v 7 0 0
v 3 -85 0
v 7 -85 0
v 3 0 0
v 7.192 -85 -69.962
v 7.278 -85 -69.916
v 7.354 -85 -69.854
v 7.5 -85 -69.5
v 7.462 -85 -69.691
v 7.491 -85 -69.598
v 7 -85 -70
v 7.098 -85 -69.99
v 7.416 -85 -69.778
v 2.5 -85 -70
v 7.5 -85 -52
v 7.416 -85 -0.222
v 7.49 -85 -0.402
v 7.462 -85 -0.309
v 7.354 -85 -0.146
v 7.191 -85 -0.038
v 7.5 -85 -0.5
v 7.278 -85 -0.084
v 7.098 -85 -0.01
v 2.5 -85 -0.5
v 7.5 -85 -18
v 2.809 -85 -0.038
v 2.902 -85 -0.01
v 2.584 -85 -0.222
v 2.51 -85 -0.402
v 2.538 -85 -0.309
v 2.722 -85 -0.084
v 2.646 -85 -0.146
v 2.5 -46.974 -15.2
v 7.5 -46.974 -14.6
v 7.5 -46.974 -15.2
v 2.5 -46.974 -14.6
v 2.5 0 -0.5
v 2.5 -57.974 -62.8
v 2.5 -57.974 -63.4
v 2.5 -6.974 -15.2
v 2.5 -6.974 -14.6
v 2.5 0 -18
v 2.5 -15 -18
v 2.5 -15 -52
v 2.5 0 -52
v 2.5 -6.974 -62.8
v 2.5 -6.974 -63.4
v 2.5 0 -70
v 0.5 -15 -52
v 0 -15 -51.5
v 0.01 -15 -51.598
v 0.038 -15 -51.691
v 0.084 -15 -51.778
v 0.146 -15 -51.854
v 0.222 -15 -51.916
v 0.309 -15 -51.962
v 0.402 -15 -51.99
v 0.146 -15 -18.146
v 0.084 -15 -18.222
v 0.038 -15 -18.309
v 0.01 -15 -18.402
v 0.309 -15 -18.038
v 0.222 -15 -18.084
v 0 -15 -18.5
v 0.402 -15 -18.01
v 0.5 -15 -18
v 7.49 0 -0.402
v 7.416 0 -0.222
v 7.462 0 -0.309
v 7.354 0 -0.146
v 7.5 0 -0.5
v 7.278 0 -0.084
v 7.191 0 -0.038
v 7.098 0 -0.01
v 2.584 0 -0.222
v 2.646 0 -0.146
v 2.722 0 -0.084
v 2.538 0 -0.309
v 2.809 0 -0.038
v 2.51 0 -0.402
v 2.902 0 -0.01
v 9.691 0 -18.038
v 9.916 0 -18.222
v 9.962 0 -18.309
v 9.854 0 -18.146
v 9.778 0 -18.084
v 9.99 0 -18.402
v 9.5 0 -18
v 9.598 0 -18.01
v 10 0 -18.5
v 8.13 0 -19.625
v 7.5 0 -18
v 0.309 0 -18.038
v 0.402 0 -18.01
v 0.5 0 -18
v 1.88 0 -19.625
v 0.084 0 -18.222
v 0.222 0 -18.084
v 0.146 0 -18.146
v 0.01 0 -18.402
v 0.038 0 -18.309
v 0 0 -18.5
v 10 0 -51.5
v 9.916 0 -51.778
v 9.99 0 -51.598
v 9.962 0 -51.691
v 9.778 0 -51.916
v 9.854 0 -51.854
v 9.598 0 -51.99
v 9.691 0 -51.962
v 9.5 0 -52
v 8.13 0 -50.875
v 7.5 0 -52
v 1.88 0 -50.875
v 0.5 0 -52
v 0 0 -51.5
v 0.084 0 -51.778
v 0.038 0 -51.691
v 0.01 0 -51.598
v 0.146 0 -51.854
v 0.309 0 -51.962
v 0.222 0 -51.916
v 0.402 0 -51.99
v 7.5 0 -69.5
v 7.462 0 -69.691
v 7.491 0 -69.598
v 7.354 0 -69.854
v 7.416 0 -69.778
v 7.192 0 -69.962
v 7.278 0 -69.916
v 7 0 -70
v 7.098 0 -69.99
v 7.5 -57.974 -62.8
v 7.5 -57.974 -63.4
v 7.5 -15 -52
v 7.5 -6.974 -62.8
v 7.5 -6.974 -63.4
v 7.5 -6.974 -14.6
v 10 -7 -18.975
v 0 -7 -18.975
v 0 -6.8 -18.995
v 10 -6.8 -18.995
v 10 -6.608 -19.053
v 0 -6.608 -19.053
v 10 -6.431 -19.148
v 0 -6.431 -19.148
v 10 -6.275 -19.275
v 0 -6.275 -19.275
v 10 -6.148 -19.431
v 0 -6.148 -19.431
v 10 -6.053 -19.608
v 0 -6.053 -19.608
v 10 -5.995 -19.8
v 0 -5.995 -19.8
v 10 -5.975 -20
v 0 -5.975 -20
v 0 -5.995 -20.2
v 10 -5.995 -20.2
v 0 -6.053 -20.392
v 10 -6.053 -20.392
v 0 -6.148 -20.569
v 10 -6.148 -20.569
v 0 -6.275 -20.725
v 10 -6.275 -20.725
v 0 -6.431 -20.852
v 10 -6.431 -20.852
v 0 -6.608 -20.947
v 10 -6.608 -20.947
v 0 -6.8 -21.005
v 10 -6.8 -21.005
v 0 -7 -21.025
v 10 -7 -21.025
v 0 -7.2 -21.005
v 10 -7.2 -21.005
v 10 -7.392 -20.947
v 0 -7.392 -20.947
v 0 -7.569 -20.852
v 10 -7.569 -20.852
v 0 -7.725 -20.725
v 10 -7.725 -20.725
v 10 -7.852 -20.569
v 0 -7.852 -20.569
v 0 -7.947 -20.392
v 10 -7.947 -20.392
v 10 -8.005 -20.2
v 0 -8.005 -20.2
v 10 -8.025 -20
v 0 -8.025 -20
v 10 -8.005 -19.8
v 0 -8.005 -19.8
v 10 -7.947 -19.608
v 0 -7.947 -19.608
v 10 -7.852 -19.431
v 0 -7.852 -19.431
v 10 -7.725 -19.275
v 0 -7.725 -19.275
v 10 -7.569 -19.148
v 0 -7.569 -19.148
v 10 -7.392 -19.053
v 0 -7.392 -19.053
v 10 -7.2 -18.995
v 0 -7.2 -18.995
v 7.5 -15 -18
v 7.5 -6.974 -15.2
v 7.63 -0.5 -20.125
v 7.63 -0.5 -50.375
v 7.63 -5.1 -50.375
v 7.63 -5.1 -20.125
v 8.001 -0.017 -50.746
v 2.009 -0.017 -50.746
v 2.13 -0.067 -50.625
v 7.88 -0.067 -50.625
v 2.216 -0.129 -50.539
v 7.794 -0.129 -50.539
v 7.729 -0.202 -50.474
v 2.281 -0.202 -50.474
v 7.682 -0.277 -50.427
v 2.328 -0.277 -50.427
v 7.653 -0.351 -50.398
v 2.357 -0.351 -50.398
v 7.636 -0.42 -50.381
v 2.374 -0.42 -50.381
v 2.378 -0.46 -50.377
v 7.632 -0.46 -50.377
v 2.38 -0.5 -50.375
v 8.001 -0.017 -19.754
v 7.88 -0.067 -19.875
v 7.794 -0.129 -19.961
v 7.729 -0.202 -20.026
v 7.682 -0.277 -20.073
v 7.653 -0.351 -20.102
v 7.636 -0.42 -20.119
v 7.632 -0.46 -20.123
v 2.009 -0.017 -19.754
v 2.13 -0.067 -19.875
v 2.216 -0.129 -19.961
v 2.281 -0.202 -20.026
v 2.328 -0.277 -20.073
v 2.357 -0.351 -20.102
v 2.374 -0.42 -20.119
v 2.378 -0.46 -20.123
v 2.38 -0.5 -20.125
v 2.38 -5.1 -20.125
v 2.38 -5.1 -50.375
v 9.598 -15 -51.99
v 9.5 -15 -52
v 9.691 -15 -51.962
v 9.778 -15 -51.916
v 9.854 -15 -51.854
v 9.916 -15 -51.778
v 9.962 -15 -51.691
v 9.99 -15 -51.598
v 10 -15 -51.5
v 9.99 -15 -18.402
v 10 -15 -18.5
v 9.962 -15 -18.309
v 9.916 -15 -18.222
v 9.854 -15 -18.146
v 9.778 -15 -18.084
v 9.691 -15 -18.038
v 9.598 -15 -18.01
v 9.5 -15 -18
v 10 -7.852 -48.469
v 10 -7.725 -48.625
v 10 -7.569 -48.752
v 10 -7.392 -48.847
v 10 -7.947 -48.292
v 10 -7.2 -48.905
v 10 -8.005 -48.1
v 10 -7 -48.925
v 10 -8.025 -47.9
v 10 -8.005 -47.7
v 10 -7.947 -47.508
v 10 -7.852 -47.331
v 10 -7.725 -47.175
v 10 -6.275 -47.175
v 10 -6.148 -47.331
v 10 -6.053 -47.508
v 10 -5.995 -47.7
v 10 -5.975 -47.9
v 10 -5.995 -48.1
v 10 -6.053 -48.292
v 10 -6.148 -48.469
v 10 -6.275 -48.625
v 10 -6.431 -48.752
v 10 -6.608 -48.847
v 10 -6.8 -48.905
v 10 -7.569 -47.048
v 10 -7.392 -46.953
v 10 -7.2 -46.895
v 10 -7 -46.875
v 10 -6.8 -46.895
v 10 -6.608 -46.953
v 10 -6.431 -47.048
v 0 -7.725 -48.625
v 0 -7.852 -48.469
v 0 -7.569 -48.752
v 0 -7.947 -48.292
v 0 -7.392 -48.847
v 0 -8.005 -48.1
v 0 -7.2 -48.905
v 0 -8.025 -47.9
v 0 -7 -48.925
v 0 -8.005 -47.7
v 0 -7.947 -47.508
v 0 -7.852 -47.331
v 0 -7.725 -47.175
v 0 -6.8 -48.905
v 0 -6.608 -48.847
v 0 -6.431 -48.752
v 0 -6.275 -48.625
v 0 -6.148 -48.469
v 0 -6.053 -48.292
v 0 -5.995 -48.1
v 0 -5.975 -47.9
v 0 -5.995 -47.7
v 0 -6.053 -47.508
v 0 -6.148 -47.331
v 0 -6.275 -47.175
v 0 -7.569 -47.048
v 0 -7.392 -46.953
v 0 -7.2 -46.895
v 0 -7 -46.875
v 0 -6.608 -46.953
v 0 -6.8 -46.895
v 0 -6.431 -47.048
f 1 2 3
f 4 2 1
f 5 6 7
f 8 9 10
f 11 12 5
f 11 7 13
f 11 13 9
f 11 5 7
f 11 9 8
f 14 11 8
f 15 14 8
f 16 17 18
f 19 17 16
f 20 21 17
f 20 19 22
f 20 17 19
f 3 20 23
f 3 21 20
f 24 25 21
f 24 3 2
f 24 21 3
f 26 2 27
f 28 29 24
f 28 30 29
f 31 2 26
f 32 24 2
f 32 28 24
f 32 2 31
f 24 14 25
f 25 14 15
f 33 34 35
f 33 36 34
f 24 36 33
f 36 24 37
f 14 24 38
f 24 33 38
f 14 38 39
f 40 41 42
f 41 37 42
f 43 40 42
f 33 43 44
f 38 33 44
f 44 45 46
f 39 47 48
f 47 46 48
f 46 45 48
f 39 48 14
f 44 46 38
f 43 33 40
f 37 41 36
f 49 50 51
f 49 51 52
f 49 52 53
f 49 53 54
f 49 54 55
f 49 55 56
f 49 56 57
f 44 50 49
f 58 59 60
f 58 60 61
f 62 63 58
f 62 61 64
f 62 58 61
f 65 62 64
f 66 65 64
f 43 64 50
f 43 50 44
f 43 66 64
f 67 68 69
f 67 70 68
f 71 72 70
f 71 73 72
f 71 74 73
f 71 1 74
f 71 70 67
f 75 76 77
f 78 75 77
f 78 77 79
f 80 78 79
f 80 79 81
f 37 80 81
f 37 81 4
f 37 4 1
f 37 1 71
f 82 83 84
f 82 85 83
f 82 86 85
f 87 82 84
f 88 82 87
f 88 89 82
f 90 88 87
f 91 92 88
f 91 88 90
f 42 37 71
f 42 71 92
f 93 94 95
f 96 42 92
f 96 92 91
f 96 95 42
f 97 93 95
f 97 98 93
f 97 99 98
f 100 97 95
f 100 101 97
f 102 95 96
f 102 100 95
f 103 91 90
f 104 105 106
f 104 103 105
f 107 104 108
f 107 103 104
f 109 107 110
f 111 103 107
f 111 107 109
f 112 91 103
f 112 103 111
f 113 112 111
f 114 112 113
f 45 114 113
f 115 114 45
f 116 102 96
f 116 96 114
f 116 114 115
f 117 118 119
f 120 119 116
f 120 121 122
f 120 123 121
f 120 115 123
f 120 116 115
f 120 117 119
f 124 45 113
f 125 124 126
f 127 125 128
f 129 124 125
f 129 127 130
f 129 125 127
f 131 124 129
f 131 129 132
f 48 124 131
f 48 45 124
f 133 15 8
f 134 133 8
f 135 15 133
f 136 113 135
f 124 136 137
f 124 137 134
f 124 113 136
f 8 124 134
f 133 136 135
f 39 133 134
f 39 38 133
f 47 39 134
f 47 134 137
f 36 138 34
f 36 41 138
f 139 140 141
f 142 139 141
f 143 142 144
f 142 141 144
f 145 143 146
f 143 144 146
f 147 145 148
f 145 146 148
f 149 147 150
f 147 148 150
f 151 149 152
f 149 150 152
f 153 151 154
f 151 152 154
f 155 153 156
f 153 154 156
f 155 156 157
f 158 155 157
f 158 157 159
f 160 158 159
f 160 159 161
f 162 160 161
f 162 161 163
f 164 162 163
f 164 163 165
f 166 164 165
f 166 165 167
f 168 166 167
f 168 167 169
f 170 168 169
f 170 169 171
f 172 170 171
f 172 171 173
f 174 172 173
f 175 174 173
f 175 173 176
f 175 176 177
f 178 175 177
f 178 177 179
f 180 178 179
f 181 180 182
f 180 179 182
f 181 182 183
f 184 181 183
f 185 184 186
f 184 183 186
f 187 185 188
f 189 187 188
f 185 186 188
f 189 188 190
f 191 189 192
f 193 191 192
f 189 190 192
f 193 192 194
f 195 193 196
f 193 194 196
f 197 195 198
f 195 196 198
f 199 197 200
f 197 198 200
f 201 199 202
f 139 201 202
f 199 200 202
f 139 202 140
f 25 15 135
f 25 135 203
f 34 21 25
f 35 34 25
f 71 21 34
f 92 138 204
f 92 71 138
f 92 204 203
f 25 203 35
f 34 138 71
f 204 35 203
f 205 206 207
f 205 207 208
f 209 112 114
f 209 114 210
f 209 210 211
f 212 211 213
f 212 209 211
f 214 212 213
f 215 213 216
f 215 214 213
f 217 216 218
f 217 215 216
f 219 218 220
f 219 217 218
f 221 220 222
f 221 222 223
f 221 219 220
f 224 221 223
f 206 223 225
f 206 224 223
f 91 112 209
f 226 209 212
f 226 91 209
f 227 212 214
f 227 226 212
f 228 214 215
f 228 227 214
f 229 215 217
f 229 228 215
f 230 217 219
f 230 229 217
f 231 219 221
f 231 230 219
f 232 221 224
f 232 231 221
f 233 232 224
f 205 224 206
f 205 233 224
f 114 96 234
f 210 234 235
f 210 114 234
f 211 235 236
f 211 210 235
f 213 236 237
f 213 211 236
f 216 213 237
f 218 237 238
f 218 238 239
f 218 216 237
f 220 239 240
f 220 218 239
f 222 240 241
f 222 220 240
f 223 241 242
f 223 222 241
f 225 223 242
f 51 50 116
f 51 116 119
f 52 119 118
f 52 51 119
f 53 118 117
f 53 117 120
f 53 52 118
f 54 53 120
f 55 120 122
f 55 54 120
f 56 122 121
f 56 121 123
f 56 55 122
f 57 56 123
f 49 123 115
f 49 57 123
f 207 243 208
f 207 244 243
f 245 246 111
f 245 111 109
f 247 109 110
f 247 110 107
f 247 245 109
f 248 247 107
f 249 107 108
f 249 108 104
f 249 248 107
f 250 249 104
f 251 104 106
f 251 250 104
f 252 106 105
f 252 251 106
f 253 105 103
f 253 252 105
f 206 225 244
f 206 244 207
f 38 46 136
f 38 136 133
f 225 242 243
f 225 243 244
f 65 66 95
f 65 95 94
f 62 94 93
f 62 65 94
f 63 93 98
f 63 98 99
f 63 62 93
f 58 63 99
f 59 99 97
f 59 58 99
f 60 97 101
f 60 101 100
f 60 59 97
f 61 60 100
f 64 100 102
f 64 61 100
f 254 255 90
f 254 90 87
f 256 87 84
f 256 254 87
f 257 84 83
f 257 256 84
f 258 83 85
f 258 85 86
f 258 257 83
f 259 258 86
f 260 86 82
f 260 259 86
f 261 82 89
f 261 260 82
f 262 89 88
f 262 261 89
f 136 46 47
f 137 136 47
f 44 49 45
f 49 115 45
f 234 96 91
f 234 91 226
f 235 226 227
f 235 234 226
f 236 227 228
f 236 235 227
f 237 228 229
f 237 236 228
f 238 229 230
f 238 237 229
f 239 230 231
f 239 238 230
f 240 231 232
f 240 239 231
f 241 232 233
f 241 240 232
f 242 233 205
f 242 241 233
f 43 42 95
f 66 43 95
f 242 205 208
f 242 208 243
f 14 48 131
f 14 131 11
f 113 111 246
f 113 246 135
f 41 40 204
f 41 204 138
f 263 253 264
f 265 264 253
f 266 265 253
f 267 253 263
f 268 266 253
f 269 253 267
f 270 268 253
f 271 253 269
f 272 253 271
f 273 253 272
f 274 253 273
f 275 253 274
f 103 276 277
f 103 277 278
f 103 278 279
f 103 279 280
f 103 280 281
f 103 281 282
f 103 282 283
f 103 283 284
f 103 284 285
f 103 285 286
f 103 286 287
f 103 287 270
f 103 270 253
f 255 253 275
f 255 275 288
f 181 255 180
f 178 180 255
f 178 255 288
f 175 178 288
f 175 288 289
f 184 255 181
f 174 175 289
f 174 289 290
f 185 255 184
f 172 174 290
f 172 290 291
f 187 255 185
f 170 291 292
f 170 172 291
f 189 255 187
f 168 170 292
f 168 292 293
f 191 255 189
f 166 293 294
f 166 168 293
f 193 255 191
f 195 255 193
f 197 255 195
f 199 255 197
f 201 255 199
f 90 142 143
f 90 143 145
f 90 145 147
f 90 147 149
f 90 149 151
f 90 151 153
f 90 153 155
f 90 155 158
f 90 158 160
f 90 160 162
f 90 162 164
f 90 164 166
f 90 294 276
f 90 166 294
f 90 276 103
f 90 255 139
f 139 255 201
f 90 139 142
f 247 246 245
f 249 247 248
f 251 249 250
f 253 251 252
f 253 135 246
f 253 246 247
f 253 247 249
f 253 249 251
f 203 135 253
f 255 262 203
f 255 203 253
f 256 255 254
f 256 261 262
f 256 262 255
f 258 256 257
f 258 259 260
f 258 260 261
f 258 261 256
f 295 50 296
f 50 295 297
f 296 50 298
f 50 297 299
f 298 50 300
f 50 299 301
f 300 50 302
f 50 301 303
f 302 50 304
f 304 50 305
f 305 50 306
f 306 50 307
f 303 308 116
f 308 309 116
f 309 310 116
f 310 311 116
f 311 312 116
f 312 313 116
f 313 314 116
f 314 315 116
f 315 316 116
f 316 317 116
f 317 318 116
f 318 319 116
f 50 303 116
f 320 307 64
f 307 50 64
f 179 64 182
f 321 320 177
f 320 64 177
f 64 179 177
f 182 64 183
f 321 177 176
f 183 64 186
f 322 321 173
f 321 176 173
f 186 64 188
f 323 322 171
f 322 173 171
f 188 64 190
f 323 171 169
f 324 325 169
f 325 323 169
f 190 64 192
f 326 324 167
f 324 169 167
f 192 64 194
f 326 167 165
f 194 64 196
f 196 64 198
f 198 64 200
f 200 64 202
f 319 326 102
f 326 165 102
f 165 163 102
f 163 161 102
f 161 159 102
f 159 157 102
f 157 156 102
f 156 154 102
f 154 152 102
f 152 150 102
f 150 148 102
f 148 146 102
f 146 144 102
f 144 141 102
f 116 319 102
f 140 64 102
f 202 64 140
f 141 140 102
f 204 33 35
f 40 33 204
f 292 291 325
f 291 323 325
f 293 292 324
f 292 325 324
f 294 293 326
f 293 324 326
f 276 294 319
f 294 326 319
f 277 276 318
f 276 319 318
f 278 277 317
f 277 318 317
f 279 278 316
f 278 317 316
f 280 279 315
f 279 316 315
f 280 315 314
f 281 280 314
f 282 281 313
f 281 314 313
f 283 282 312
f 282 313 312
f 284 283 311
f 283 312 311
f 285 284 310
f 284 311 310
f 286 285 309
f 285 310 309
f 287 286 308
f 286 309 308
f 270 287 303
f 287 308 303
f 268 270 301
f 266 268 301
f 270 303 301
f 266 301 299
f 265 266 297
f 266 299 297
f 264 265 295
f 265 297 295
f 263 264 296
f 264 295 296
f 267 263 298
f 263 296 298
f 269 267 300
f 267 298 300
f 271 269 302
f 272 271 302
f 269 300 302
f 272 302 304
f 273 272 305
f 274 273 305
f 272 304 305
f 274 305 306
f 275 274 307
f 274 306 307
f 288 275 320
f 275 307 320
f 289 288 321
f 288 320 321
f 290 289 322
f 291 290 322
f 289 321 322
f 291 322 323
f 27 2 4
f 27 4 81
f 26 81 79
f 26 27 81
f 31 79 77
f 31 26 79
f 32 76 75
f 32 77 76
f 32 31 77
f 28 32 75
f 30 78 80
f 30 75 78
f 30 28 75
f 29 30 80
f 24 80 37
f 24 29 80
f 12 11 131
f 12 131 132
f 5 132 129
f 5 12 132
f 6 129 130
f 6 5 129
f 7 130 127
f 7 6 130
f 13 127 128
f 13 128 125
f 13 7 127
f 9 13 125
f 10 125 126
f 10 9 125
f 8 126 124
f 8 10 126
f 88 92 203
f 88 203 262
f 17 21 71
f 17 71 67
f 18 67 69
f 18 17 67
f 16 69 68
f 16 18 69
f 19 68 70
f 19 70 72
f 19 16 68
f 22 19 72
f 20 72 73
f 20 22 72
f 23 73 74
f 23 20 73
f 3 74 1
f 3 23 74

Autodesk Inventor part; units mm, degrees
ref_plane "YZ Plane" through (0, 0, 0) normal (1, 0, 0) x (0, 1, 0)
ref_plane "XZ Plane" through (0, 0, 0) normal (0, 1, 0) x (-1, 0, 0)
ref_plane "XY Plane" through (0, 0, 0) normal (0, 0, 1) x (1, 0, 0)
sketch "Sketch1" plane through (0, 0, 0) normal (1, 0, 0) x (0, 1, 0)
  line L0 (0, 0) -> (0, -70)
  line L1 (0, -70) -> (-85, -70)
  line L2 (-85, -70) -> (-85, 0)
  line L3 (-85, 0) -> (0, 0)
  dimension "d0" = 70
  dimension "d1" = 85
extrude "Extrusion1" add sketch "Sketch1" along normal blind 10
sketch "Sketch2" plane through (0, 0, 0) normal (0, 1, 0) x (1, 0, 0)
  line L0 (0, 0) -> (0, 70) projected
  line L1 (0, 0) -> (0, 20.125)
  line L2 (0, 20.125) -> (2.38, 20.125)
  line L3 (2.38, 20.125) -> (2.38, 50.375)
  line L4 (2.38, 50.375) -> (7.63, 50.375)
  line L5 (7.63, 50.375) -> (7.63, 20.125)
  line L6 (7.63, 20.125) -> (2.38, 20.125)
  dimension "d4" = 20.125
  dimension "d5" = 2.38
  dimension "d6" = 30.25
  dimension "d7" = 5.25
extrude "Extrusion2" cut sketch "Sketch2" against normal blind 5.1
sketch "Sketch3" plane through (0, 0, 0) normal (-1, 0, 0) x (0, 0, 1)
  line L0 (0, 0) -> (0, -85) projected
  line L1 (0, 0) -> (-20, 0)
  line L2 (-70, 0) -> (0, 0) projected
  line L3 (-20, 0) -> (-20, -7)
  circle A0 centre (-20, -7) radius 1.025
  circle A1 centre (-47.9, -7) radius 1.025
  line L4 (-20, -7) -> (-14.9, -7)
  line L5 (-14.9, -7) -> (-14.6, -7)
  line L6 (-14.6, -7) -> (-14.6, -47)
  line L7 (-14.6, -47) -> (-15.2, -47)
  line L8 (-15.2, -47) -> (-15.2, -7)
  line L9 (-15.2, -7) -> (-14.6, -7)
  line L10 (-20, -7) -> (-21.025, -7)
  line L11 (-46.875, -7) -> (-47.9, -7)
  line L12 (-47.9, -7) -> (-63.1, -7)
  line L13 (-63.1, -7) -> (-63.1, -47)
  line L14 (-63.1, -58) -> (-63.4, -58)
  line L15 (-63.4, -58) -> (-63.4, -7)
  line L16 (-63.4, -7) -> (-62.8, -7)
  line L17 (-62.8, -7) -> (-62.8, -58)
  line L18 (-62.8, -58) -> (-63.1, -58)
  line L19 (-47.9, -7) -> (-20, -7)
  line L20 (-63.1, -47) -> (-63.1, -58)
  line L21 (-70, -85) -> (-70, 0) projected
  line L22 (-63.1, -58) -> (-62.8, -58)
  line L23 (-62.8, -58) -> (-62.8, -7)
  line L24 (-63.4, -7) -> (-62.8, -7)
  dimension "d12" = 2.05
  dimension "d14" = 2.05
  dimension "d10" = 20
  dimension "d11" = 7
  dimension "d13" = 27.9
  dimension "d17" = 5.1
  dimension "d18" = 0.3
  dimension "d19" = 40
  dimension "d20" = 0.6
  dimension "d21" = 40
  dimension "d22" = 15.2
  dimension "d23" = 51
  dimension "d24" = 0.3
  dimension "d25" = 0.6
  dimension "d26" = 51
extrude "Extrusion3" cut sketch "Sketch3" against normal blind 10 contours A0 L4 L3 | A1 L12 L11 | L11 L12 A1 | L3 L10 A0 | L4 A0 L10
sketch "Sketch4" plane through (0, 0, 0) normal (-1, 0, 0) x (0, 0, 1)
  circle A0 centre (-19.9999, -6.9744) radius 1.25
  circle A1 centre (-47.8999, -6.9744) radius 1.25
  line L0 (-19.9999, -6.9744) -> (-14.8999, -6.9744)
  line L1 (-14.8999, -6.9744) -> (-14.5999, -6.9744)
  line L2 (-14.5999, -6.9744) -> (-14.5999, -46.9744)
  line L3 (-14.5999, -46.9744) -> (-15.1999, -46.9744)
  line L4 (-15.1999, -46.9744) -> (-15.1999, -6.9744)
  line L5 (-15.1999, -6.9744) -> (-14.5999, -6.9744)
  line L6 (-19.9999, -6.9744) -> (-21.2499, -6.9744)
  line L7 (-46.6499, -6.9744) -> (-47.8999, -6.9744)
  line L8 (-47.8999, -6.9744) -> (-63.0999, -6.9744)
  line L9 (-63.0999, -6.9744) -> (-63.0999, -46.9744)
  line L10 (-63.0999, -57.9744) -> (-63.3999, -57.9744)
  line L11 (-63.3999, -57.9744) -> (-63.3999, -6.9744)
  line L12 (-63.3999, -6.9744) -> (-62.7999, -6.9744)
  line L13 (-62.7999, -6.9744) -> (-62.7999, -57.9744)
  line L14 (-62.7999, -57.9744) -> (-63.0999, -57.9744)
  line L15 (-47.8999, -6.9744) -> (-19.9999, -6.9744)
  line L16 (-63.0999, -46.9744) -> (-63.0999, -57.9744)
  line L17 (-63.0999, -57.9744) -> (-62.7999, -57.9744)
  line L18 (-62.7999, -57.9744) -> (-62.7999, -6.9744)
  line L19 (-63.3999, -6.9744) -> (-62.7999, -6.9744)
  point P0 (0, 0)
  dimension "d27" = 2.5
  dimension "d29" = 2.5
  dimension "d28" = 27.9
  dimension "d30" = 5.1
  dimension "d31" = 0.3
  dimension "d32" = 40
  dimension "d33" = 0.6
  dimension "d34" = 40
  dimension "d35" = 15.2
  dimension "d36" = 51
  dimension "d37" = 0.3
  dimension "d38" = 0.6
  dimension "d39" = 51
extrude "Extrusion4" cut sketch "Sketch4" against normal blind 10 contours L13 L14 L16 L9 L8 | L0 L1 L2 L3 L4 | L9 L16 L10 L11 L12
sketch "Sketch5" plane through (0, 0, 0) normal (0, 1, 0) x (1, 0, 0)
  line L0 (0, 0) -> (10, 0) projected
  line L1 (0, 0) -> (2.5, 0)
  line L2 (2.5, 0) -> (2.5, 18)
  line L3 (2.5, 18) -> (0, 18)
  line L4 (0, 70) -> (0, 0) projected
  line L5 (10, 0) -> (7.5, 0)
  line L6 (7.5, 0) -> (7.5, 18)
  line L7 (7.5, 18) -> (10, 18)
  line L8 (10, 70) -> (10, 0) projected
  line L9 (10, 0) -> (10, 18)
  line L10 (7.5, 0) -> (7.5, 18)
  line L11 (10, 18) -> (10, 0)
  line L12 (0, 18.975) -> (10, 18.975) projected
  line L13 (10, 70) -> (10, 52)
  line L14 (10, 52) -> (7.5003, 52)
  line L15 (7.5003, 52) -> (7.5003, 70)
  line L16 (7.5003, 70) -> (10, 70)
  line L17 (10, 70) -> (10, 52)
  line L18 (10, 70) -> (10, 52)
  line L19 (0, 70) -> (0, 52)
  line L20 (0, 52) -> (2.5, 52)
  line L21 (2.5, 52) -> (2.5, 70)
  line L22 (2.5, 70) -> (0, 70)
  dimension "d42" = 2.5
  dimension "d43" = 18
  dimension "d44" = 2.5
  dimension "d45" = 18
  dimension "d46" = 18
  dimension "d47" = 18
extrude "Extrusion5" cut sketch "Sketch5" against normal through all contours L4 L3 L2 L0 | L4 L22 L21 L20 | L14 L15 L16 L8 | L6 L7 L8 L0
sketch "Sketch6" plane through (0, -85, -52) normal (0, -1, 0) x (1, 0, 0)
  line L0 (2.5, 34) -> (2.5, 52) projected
  line L1 (2.5, 0) -> (2.5, 34)
  line L2 (2.5, 34) -> (0, 34)
  line L3 (0, 0) -> (0, 34) projected
  line L4 (0, 34) -> (0, 0)
  line L5 (0, 0) -> (2.5, 0)
  line L6 (7.5003, 0) -> (7.5003, 34)
  line L7 (10.0003, 34) -> (10.0003, 0)
  line L8 (10.0003, 0) -> (7.5003, 0)
  line L9 (7.5003, -18) -> (7.5003, 0) projected
  line L10 (7.5, 52) -> (7.5, 34) projected
  line L11 (7.5, 34) -> (7.5, 4)
  line L12 (7.5, 4) -> (7.5003, 0)
  line L13 (7.5, 34) -> (10, 34) projected
  line L14 (7.5, 34) -> (10, 34)
  point P0 (0, 52)
  dimension "d52" = 2.5
  dimension "d53" = 30
extrude "Extrusion6" cut sketch "Sketch6" against normal blind 70 contours L5 L3 L2 L1
sketch "Sketch7" plane through (2.5, -85, -70) normal (0, -1, 0) x (1, 0, 0)
  line L0 (5, 52) -> (7.5, 52) projected
  line L1 (5.0003, 18) -> (5, 52)
  line L2 (5, 52) -> (7.5, 52)
  line L3 (7.5, 52) -> (7.5, 18)
  line L4 (7.5, 18) -> (5.0003, 18)
  point P0 (-2.5, 70)
extrude "Extrusion7" cut sketch "Sketch7" against normal blind 70
fillet "Fillet1" radius 0.5 11 edges at (7.5003, -42.5, -70) (2.5, -42.5, 0) (7.5, -42.5, 0) (10, -7.5, -18) (10, -7.5, -52) (0, -7.5, -18) (0, -7.5, -52) (7.63, 0, -35.25) (2.38, 0, -35.25) (5.005, 0, -20.125) (5.005, 0, -50.375)
properties part number "Chassis_Lower_Portion"
